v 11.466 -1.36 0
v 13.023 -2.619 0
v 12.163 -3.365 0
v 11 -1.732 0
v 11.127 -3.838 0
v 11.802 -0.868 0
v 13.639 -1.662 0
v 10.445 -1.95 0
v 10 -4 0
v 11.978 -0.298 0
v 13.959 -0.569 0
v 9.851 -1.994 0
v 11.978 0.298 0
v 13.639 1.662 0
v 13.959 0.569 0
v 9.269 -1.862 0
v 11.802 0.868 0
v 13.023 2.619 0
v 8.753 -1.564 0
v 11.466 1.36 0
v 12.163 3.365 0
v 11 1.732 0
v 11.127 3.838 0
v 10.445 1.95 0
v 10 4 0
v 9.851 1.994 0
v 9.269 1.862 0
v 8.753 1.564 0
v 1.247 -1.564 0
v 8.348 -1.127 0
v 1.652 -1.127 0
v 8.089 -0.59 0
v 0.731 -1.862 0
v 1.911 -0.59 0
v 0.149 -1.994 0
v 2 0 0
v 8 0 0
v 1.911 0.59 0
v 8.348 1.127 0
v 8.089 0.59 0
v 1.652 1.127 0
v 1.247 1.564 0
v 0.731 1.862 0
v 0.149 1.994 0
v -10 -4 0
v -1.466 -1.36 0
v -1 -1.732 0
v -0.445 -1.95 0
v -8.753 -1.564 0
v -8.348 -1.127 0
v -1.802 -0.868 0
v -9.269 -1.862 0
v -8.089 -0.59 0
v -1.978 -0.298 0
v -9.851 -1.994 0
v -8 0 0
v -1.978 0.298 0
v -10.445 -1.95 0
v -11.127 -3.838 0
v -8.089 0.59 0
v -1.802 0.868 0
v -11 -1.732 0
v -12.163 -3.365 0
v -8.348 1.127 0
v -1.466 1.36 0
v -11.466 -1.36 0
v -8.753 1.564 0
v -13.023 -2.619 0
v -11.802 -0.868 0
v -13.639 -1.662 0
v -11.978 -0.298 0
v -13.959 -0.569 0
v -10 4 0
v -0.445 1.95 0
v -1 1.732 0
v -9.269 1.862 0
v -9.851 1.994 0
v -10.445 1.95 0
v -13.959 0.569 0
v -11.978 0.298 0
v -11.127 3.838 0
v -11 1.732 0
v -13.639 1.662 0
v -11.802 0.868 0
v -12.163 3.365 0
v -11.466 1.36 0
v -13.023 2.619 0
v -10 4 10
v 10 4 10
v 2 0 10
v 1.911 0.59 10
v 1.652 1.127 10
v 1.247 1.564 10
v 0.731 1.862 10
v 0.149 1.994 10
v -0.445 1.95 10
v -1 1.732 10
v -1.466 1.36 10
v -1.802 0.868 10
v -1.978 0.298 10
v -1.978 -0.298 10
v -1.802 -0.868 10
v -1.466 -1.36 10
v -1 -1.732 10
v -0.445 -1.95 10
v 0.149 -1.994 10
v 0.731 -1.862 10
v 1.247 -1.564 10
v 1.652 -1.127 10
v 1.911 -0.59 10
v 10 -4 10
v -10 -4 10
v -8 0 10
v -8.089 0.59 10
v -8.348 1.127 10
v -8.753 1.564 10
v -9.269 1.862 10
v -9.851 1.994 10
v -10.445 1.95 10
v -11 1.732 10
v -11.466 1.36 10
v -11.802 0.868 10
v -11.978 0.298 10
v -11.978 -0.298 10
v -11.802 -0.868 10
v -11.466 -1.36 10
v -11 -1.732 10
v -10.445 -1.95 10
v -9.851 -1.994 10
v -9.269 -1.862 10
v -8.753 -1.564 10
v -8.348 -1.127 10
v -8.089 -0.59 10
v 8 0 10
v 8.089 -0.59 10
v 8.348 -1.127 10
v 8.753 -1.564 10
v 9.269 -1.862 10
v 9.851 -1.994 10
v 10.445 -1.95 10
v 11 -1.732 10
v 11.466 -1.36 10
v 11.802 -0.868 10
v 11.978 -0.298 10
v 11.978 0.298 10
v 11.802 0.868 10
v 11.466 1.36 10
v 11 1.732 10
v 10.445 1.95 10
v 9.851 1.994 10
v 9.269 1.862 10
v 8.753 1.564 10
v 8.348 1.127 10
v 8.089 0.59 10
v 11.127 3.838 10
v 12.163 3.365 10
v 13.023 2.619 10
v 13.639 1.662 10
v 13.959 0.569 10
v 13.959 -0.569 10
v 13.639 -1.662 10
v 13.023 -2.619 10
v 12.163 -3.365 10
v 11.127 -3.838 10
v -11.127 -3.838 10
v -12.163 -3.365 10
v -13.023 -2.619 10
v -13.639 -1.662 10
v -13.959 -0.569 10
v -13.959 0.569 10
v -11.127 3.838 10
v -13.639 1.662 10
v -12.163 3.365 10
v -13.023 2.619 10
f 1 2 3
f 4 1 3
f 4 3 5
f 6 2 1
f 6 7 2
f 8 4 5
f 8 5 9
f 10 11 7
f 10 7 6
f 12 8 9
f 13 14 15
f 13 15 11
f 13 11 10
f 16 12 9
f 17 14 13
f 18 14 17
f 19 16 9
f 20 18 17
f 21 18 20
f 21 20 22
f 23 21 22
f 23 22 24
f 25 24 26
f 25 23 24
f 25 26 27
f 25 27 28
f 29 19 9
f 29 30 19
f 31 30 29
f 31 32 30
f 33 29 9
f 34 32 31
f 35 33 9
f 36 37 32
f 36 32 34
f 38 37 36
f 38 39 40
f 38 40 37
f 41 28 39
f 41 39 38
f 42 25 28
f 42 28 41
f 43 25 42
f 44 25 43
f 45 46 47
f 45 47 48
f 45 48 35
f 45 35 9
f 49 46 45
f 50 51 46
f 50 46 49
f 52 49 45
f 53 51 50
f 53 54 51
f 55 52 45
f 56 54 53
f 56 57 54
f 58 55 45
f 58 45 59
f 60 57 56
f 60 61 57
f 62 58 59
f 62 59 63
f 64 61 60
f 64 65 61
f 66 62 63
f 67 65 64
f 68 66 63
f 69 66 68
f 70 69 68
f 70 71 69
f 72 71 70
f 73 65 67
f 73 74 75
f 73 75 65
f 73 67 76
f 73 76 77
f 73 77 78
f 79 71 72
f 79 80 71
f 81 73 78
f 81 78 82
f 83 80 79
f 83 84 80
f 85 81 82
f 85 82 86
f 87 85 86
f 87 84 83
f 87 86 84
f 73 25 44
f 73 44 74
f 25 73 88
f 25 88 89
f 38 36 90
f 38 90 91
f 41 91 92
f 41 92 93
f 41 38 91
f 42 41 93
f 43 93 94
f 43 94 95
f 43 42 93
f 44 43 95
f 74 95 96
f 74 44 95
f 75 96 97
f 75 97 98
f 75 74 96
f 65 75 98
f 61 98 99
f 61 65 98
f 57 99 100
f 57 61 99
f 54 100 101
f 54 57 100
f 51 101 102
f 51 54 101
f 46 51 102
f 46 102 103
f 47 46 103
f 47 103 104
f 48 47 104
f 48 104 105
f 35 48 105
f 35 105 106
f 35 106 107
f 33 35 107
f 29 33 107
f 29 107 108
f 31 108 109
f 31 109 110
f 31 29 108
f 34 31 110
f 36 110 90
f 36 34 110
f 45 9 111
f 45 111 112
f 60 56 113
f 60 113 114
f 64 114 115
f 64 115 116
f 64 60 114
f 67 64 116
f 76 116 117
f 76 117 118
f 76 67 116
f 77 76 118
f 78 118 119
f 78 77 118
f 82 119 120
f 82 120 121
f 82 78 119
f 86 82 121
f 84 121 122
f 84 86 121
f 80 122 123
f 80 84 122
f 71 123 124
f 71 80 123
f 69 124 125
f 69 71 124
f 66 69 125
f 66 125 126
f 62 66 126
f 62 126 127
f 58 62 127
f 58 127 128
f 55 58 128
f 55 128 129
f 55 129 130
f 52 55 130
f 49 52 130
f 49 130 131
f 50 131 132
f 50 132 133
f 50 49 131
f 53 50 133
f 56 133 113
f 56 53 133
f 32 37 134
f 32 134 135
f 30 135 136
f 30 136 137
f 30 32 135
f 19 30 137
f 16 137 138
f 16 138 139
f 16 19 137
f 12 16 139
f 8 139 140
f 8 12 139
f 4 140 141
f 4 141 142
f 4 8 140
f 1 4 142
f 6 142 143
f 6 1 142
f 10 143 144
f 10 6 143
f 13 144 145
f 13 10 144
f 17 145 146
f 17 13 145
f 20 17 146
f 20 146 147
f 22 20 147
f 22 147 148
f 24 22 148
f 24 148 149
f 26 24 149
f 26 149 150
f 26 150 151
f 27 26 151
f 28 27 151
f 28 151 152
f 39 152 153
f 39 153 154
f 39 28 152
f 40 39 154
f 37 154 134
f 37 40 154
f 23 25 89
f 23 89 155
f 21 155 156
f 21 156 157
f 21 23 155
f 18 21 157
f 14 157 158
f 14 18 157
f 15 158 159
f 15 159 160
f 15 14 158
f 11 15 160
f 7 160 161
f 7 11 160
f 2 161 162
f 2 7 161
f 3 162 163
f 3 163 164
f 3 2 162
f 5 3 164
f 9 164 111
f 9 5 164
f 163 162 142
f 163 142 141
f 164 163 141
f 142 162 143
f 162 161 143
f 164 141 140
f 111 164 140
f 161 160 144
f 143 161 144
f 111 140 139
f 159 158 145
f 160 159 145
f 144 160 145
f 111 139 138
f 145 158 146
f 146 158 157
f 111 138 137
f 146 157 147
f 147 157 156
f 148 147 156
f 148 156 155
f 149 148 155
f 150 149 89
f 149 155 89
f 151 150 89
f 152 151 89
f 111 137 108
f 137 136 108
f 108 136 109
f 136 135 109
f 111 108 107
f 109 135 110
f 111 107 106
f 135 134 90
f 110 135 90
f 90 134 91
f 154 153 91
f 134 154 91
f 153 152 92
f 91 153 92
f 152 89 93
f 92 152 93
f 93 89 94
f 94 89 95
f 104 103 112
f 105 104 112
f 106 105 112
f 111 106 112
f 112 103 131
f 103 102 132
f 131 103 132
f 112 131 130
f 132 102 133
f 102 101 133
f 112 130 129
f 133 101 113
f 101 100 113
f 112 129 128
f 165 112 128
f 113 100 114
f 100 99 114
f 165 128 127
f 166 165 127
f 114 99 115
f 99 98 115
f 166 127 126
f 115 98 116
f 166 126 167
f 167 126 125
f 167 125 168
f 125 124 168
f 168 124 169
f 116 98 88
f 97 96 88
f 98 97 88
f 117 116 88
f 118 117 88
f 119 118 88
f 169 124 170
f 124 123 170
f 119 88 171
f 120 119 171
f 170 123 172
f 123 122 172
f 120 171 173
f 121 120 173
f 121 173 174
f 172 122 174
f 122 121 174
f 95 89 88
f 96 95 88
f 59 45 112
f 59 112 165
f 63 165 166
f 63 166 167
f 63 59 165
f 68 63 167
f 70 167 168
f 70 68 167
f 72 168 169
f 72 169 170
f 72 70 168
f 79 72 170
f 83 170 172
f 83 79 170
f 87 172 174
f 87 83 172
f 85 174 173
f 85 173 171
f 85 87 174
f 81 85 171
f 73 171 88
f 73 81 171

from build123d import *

# Parameters (mm, degrees)
SKETCH_1_R      = 2
EXTRUDE_1_DEPTH = 10


with BuildPart() as part:
    # 草图1 → 凸台-拉伸1 (new body)
    with BuildSketch(Plane.XY):
        with BuildLine():
            Line((-10, 4), (10, 4))
            ThreePointArc((10, 4), (14, 0), (10, -4))
            Line((10, -4), (-10, -4))
            ThreePointArc((-10, -4), (-14, 0), (-10, 4))
        make_face()
        with Locations((-10, 0)):
            Circle(SKETCH_1_R, mode=Mode.SUBTRACT)
        with Locations(Location((10, 0, 0), (0, 0, 180))):
            Circle(SKETCH_1_R, mode=Mode.SUBTRACT)
        Circle(SKETCH_1_R, mode=Mode.SUBTRACT)
    extrude(amount=EXTRUDE_1_DEPTH)


solid = part.part
